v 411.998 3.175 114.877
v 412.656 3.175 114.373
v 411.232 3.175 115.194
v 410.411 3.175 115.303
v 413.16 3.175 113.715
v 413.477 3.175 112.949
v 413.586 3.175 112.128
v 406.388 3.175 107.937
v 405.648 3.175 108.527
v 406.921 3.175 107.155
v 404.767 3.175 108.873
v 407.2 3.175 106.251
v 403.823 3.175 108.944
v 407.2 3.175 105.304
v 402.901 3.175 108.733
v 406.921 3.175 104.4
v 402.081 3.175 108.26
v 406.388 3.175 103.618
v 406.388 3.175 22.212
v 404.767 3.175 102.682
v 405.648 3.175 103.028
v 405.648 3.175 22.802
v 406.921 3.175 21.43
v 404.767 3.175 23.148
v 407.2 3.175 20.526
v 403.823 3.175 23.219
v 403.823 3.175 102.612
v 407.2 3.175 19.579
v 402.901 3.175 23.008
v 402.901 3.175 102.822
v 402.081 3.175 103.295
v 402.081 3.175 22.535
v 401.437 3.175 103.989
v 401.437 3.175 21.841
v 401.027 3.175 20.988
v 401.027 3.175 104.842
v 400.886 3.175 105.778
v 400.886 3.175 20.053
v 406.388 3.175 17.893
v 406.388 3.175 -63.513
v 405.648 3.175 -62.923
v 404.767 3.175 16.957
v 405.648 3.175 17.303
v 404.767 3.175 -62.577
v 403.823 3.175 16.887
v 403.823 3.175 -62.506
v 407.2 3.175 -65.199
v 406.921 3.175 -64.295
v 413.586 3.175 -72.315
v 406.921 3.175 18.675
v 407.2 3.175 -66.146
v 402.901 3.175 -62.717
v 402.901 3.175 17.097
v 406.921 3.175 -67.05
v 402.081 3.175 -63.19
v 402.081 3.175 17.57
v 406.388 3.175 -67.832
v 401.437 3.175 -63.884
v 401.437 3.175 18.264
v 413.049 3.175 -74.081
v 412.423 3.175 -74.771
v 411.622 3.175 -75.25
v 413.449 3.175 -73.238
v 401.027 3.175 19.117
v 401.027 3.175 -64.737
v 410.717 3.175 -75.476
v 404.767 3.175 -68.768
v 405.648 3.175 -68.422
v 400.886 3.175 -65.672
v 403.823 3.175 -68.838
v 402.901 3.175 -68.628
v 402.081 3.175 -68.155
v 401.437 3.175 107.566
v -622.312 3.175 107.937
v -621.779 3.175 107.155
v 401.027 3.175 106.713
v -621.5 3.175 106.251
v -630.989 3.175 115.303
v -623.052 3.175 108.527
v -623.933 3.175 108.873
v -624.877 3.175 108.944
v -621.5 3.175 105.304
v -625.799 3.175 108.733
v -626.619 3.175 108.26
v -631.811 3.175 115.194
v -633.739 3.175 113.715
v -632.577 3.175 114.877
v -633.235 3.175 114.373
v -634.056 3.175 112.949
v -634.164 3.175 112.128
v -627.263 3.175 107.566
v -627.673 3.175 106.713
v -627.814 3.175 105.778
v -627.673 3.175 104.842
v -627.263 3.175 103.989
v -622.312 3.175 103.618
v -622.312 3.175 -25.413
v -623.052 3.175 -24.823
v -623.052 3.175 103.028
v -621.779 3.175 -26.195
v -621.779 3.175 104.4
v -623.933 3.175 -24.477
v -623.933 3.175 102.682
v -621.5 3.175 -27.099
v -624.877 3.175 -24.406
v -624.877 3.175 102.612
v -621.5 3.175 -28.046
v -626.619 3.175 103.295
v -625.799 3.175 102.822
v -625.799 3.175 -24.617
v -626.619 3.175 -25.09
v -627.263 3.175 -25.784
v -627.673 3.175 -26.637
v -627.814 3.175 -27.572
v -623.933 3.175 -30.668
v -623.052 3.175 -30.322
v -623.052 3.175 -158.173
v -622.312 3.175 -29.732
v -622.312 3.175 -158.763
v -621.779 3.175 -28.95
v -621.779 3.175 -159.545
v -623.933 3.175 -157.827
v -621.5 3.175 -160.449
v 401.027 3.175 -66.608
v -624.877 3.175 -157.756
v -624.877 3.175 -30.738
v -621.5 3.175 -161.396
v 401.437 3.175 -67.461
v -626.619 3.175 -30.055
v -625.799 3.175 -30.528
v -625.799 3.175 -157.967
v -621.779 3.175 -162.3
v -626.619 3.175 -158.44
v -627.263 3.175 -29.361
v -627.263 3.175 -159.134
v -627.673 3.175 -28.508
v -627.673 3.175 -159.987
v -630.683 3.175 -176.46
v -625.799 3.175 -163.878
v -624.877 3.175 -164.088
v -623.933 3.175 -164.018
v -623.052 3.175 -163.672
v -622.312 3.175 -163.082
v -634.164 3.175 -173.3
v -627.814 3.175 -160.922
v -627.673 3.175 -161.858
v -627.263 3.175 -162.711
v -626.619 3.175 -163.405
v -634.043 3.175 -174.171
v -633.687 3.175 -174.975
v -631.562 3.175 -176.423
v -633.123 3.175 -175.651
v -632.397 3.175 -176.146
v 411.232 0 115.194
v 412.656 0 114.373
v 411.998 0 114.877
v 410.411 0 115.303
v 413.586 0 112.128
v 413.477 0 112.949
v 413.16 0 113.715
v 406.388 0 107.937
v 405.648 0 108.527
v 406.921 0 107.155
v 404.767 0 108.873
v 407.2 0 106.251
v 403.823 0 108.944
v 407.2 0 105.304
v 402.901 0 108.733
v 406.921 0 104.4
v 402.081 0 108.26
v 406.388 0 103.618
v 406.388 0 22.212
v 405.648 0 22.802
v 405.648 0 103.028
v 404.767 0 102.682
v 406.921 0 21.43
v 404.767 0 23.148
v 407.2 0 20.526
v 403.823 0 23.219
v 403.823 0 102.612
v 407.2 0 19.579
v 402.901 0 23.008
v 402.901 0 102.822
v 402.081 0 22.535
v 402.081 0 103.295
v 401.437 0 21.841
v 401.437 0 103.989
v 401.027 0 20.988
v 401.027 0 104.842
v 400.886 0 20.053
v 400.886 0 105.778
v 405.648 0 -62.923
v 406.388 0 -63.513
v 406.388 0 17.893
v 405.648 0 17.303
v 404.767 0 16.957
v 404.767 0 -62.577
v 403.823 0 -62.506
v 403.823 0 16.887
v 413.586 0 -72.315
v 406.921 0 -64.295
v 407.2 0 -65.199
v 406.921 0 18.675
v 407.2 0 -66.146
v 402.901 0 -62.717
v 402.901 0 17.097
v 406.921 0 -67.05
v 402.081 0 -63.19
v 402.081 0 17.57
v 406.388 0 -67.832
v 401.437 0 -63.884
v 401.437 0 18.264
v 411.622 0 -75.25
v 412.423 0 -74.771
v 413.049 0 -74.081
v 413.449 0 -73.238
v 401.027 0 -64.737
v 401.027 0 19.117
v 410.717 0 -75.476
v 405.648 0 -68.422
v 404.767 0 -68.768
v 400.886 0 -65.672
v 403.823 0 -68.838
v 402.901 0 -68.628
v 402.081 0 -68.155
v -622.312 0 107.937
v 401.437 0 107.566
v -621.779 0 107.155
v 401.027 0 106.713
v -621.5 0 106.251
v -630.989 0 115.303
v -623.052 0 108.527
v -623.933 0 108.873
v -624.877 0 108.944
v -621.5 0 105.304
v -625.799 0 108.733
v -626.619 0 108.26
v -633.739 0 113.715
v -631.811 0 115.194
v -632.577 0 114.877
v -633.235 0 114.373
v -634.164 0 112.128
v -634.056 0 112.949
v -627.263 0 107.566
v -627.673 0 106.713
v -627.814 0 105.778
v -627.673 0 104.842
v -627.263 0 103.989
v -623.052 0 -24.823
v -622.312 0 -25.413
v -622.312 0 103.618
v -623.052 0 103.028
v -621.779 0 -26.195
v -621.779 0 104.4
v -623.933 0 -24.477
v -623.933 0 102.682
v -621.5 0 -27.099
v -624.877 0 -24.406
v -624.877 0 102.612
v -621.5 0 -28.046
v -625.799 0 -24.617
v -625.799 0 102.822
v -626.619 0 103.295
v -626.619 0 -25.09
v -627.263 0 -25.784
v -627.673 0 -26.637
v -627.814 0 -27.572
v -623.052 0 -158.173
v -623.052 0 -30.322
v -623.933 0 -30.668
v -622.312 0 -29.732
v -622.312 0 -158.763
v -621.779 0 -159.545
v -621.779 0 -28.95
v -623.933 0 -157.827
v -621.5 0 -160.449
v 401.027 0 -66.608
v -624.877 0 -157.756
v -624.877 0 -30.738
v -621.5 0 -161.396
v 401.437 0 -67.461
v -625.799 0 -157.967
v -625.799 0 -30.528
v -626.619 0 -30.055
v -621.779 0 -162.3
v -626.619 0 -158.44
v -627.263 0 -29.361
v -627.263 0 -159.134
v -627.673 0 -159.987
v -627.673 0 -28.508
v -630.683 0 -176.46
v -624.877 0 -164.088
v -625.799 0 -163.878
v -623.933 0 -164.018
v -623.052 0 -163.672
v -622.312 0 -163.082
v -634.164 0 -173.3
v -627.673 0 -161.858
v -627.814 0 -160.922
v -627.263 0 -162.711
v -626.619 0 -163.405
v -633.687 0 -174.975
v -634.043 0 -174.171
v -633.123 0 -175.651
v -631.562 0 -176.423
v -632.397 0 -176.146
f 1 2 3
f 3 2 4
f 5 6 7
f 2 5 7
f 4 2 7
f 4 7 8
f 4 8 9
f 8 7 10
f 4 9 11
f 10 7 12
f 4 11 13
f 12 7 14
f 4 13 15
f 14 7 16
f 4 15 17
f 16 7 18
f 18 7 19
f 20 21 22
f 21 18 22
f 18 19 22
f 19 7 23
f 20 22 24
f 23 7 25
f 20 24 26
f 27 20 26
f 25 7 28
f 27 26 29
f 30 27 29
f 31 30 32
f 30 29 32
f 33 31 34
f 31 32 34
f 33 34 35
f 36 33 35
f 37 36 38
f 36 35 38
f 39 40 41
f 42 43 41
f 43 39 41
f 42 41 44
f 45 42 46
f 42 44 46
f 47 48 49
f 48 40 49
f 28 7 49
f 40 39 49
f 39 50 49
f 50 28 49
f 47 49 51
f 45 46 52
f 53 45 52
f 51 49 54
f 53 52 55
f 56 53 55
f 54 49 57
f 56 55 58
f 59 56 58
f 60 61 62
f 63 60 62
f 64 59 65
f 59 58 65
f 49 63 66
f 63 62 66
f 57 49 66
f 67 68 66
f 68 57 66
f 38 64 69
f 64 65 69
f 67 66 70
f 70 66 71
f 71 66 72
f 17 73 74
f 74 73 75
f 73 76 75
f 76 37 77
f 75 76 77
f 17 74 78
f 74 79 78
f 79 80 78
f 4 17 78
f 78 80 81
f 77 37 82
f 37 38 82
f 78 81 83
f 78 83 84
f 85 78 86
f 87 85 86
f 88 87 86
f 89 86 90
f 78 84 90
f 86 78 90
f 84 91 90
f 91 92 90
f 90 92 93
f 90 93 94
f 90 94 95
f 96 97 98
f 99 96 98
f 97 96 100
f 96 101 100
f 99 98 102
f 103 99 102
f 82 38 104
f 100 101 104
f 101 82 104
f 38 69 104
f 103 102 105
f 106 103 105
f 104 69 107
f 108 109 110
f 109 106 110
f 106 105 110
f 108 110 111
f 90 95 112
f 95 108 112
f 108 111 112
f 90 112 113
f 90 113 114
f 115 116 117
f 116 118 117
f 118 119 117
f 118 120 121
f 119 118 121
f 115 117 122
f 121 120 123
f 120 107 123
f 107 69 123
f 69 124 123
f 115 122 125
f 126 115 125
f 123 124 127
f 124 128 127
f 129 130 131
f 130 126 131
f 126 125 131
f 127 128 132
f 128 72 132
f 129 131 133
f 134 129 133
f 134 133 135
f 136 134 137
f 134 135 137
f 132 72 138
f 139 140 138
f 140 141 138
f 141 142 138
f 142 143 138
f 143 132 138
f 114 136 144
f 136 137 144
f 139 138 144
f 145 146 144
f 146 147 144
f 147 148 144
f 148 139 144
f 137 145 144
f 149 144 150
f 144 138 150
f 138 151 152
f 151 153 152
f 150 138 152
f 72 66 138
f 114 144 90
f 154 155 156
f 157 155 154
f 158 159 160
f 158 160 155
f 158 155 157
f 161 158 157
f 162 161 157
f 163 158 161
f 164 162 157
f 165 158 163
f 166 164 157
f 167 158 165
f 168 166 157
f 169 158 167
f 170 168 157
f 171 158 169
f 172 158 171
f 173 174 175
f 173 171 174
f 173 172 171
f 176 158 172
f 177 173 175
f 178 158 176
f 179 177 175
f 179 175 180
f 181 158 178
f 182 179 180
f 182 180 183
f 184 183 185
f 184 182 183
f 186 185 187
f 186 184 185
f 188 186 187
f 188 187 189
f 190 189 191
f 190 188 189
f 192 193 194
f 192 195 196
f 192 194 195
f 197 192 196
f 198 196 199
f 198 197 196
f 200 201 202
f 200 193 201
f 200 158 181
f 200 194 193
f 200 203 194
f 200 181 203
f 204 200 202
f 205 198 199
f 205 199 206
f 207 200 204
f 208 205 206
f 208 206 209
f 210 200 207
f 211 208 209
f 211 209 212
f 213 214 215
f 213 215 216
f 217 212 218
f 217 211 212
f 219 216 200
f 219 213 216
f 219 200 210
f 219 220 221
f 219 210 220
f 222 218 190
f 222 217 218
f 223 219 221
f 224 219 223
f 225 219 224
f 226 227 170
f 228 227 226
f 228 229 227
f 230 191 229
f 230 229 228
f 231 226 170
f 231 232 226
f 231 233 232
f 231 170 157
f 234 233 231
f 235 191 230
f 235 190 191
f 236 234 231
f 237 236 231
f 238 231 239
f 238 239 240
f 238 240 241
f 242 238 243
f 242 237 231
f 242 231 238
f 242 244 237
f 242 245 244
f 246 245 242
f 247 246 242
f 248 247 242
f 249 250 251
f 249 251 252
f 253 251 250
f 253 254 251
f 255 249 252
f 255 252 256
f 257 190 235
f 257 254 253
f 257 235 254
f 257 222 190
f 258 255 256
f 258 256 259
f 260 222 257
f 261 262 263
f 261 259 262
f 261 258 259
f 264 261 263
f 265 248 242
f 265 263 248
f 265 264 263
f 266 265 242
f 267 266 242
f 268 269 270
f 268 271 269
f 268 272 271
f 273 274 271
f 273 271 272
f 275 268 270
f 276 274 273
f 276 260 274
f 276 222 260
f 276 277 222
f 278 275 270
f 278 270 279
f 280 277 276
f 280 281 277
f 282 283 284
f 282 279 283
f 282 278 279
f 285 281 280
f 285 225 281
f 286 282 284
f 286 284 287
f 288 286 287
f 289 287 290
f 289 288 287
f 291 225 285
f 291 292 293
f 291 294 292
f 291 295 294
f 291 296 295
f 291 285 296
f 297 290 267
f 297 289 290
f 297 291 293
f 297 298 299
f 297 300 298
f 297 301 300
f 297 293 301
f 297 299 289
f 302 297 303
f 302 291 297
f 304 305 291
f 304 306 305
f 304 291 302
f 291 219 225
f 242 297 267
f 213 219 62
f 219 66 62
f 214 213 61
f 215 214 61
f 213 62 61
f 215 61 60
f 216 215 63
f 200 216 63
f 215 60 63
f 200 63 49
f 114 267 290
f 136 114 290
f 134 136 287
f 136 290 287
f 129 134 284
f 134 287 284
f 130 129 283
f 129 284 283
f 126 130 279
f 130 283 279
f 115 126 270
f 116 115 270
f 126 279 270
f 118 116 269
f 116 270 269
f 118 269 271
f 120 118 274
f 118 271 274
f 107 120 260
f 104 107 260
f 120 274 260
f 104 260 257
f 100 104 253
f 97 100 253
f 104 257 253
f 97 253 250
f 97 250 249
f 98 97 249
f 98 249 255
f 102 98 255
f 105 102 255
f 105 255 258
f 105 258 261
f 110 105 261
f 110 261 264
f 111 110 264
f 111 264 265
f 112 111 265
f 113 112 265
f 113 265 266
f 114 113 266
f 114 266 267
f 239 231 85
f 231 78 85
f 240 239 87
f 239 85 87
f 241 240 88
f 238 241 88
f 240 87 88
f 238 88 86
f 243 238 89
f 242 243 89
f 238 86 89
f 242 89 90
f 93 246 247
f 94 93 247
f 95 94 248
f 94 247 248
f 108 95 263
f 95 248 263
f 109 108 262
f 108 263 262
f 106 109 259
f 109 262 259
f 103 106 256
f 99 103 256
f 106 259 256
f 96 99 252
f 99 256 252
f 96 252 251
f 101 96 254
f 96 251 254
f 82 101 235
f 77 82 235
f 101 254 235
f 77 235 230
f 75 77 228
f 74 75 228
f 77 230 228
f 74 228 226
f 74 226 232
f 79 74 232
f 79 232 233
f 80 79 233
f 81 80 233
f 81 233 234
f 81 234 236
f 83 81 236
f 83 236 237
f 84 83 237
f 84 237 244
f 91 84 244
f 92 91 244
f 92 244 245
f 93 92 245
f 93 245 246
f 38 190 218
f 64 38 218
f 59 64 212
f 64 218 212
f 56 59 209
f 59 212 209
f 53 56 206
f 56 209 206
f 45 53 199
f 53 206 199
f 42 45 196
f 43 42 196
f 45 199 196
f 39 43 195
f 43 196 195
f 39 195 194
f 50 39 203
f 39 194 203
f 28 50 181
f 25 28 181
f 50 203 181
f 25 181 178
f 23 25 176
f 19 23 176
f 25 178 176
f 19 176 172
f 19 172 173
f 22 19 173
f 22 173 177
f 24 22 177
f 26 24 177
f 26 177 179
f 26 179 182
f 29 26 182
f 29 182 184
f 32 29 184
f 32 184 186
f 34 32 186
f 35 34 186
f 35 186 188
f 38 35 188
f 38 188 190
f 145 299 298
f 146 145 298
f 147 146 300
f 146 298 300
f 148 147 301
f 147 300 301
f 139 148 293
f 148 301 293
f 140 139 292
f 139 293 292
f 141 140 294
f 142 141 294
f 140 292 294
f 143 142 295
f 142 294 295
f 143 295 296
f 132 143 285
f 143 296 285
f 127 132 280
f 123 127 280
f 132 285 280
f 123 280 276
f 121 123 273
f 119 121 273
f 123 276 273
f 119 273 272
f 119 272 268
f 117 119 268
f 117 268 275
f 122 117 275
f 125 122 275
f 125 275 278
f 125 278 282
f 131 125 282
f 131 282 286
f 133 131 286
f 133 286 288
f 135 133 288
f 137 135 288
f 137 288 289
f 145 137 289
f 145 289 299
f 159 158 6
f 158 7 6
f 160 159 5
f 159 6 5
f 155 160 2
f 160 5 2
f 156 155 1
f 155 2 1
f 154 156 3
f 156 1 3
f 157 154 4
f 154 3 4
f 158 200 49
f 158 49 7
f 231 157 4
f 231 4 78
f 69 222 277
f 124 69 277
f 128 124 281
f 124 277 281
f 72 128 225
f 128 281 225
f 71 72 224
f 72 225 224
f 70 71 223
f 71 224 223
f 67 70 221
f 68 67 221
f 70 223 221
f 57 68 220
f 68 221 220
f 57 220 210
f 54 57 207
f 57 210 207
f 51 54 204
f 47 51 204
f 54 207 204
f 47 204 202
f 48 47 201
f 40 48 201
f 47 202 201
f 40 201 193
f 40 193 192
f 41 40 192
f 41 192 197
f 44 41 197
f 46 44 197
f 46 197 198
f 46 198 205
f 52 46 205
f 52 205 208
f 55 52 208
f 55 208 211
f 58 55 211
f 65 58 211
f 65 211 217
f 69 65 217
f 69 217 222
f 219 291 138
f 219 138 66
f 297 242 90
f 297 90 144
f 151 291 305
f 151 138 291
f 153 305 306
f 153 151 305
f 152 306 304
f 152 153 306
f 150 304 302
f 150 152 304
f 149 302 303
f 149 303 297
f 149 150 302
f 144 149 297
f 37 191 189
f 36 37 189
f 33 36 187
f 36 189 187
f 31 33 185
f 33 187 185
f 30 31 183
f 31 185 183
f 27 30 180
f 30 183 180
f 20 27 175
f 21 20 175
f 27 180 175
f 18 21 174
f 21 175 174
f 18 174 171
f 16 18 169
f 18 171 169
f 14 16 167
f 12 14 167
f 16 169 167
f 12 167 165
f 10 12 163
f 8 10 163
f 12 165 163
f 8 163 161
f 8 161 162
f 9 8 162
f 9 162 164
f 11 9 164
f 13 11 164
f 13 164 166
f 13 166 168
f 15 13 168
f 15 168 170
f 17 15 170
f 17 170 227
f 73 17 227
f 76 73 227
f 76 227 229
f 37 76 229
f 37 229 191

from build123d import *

# Parameters (mm, degrees)
BOSS_EXTRUDE1_DEPTH         = 3.175
FILLET1_R                   = 3.175
F_1_4_0_25_DIAMETER_HOLE1_D = 6.35


with BuildPart() as part:
    # Sketch1 → Boss-Extrude1 (new body)
    with BuildSketch(Plane(origin=(0, 0, 0), x_dir=(1, 0, 0), z_dir=(0, 1, 0))):
        Polygon((-634.164473684, 176.797368421), (413.585526316, 75.197368421), (413.585526316, -115.302631579), (-634.164473684, -115.302631579), align=None)
    extrude(amount=BOSS_EXTRUDE1_DEPTH)

    # Fillet1
    fillet1_edges = [part.edges().sort_by_distance(p)[0] for p in [
        (413.585526316, 1.5875, 115.302631579),
        (-634.164473684, 1.5875, 115.302631579),
        (-634.164473684, 1.5875, -176.797368421),
        (413.585526316, 1.5875, -75.197368421),
    ]]
    fillet(fillet1_edges, radius=FILLET1_R)

    # 1/4 (0.25) Diameter Hole1 (through all)
    with Locations(Plane(origin=(0, 3.175, 0), x_dir=(1, 0, 0), z_dir=(0, 1, 0))):
        with Locations((404.060526316, 65.672368421), (404.060526316, -20.052631579), (404.060526316, -105.777631579), (-624.639473684, -105.777631579), (-624.639473684, 27.572368421), (-624.639473684, 160.922368421)):
            Hole(F_1_4_0_25_DIAMETER_HOLE1_D / 2)


solid = part.part
